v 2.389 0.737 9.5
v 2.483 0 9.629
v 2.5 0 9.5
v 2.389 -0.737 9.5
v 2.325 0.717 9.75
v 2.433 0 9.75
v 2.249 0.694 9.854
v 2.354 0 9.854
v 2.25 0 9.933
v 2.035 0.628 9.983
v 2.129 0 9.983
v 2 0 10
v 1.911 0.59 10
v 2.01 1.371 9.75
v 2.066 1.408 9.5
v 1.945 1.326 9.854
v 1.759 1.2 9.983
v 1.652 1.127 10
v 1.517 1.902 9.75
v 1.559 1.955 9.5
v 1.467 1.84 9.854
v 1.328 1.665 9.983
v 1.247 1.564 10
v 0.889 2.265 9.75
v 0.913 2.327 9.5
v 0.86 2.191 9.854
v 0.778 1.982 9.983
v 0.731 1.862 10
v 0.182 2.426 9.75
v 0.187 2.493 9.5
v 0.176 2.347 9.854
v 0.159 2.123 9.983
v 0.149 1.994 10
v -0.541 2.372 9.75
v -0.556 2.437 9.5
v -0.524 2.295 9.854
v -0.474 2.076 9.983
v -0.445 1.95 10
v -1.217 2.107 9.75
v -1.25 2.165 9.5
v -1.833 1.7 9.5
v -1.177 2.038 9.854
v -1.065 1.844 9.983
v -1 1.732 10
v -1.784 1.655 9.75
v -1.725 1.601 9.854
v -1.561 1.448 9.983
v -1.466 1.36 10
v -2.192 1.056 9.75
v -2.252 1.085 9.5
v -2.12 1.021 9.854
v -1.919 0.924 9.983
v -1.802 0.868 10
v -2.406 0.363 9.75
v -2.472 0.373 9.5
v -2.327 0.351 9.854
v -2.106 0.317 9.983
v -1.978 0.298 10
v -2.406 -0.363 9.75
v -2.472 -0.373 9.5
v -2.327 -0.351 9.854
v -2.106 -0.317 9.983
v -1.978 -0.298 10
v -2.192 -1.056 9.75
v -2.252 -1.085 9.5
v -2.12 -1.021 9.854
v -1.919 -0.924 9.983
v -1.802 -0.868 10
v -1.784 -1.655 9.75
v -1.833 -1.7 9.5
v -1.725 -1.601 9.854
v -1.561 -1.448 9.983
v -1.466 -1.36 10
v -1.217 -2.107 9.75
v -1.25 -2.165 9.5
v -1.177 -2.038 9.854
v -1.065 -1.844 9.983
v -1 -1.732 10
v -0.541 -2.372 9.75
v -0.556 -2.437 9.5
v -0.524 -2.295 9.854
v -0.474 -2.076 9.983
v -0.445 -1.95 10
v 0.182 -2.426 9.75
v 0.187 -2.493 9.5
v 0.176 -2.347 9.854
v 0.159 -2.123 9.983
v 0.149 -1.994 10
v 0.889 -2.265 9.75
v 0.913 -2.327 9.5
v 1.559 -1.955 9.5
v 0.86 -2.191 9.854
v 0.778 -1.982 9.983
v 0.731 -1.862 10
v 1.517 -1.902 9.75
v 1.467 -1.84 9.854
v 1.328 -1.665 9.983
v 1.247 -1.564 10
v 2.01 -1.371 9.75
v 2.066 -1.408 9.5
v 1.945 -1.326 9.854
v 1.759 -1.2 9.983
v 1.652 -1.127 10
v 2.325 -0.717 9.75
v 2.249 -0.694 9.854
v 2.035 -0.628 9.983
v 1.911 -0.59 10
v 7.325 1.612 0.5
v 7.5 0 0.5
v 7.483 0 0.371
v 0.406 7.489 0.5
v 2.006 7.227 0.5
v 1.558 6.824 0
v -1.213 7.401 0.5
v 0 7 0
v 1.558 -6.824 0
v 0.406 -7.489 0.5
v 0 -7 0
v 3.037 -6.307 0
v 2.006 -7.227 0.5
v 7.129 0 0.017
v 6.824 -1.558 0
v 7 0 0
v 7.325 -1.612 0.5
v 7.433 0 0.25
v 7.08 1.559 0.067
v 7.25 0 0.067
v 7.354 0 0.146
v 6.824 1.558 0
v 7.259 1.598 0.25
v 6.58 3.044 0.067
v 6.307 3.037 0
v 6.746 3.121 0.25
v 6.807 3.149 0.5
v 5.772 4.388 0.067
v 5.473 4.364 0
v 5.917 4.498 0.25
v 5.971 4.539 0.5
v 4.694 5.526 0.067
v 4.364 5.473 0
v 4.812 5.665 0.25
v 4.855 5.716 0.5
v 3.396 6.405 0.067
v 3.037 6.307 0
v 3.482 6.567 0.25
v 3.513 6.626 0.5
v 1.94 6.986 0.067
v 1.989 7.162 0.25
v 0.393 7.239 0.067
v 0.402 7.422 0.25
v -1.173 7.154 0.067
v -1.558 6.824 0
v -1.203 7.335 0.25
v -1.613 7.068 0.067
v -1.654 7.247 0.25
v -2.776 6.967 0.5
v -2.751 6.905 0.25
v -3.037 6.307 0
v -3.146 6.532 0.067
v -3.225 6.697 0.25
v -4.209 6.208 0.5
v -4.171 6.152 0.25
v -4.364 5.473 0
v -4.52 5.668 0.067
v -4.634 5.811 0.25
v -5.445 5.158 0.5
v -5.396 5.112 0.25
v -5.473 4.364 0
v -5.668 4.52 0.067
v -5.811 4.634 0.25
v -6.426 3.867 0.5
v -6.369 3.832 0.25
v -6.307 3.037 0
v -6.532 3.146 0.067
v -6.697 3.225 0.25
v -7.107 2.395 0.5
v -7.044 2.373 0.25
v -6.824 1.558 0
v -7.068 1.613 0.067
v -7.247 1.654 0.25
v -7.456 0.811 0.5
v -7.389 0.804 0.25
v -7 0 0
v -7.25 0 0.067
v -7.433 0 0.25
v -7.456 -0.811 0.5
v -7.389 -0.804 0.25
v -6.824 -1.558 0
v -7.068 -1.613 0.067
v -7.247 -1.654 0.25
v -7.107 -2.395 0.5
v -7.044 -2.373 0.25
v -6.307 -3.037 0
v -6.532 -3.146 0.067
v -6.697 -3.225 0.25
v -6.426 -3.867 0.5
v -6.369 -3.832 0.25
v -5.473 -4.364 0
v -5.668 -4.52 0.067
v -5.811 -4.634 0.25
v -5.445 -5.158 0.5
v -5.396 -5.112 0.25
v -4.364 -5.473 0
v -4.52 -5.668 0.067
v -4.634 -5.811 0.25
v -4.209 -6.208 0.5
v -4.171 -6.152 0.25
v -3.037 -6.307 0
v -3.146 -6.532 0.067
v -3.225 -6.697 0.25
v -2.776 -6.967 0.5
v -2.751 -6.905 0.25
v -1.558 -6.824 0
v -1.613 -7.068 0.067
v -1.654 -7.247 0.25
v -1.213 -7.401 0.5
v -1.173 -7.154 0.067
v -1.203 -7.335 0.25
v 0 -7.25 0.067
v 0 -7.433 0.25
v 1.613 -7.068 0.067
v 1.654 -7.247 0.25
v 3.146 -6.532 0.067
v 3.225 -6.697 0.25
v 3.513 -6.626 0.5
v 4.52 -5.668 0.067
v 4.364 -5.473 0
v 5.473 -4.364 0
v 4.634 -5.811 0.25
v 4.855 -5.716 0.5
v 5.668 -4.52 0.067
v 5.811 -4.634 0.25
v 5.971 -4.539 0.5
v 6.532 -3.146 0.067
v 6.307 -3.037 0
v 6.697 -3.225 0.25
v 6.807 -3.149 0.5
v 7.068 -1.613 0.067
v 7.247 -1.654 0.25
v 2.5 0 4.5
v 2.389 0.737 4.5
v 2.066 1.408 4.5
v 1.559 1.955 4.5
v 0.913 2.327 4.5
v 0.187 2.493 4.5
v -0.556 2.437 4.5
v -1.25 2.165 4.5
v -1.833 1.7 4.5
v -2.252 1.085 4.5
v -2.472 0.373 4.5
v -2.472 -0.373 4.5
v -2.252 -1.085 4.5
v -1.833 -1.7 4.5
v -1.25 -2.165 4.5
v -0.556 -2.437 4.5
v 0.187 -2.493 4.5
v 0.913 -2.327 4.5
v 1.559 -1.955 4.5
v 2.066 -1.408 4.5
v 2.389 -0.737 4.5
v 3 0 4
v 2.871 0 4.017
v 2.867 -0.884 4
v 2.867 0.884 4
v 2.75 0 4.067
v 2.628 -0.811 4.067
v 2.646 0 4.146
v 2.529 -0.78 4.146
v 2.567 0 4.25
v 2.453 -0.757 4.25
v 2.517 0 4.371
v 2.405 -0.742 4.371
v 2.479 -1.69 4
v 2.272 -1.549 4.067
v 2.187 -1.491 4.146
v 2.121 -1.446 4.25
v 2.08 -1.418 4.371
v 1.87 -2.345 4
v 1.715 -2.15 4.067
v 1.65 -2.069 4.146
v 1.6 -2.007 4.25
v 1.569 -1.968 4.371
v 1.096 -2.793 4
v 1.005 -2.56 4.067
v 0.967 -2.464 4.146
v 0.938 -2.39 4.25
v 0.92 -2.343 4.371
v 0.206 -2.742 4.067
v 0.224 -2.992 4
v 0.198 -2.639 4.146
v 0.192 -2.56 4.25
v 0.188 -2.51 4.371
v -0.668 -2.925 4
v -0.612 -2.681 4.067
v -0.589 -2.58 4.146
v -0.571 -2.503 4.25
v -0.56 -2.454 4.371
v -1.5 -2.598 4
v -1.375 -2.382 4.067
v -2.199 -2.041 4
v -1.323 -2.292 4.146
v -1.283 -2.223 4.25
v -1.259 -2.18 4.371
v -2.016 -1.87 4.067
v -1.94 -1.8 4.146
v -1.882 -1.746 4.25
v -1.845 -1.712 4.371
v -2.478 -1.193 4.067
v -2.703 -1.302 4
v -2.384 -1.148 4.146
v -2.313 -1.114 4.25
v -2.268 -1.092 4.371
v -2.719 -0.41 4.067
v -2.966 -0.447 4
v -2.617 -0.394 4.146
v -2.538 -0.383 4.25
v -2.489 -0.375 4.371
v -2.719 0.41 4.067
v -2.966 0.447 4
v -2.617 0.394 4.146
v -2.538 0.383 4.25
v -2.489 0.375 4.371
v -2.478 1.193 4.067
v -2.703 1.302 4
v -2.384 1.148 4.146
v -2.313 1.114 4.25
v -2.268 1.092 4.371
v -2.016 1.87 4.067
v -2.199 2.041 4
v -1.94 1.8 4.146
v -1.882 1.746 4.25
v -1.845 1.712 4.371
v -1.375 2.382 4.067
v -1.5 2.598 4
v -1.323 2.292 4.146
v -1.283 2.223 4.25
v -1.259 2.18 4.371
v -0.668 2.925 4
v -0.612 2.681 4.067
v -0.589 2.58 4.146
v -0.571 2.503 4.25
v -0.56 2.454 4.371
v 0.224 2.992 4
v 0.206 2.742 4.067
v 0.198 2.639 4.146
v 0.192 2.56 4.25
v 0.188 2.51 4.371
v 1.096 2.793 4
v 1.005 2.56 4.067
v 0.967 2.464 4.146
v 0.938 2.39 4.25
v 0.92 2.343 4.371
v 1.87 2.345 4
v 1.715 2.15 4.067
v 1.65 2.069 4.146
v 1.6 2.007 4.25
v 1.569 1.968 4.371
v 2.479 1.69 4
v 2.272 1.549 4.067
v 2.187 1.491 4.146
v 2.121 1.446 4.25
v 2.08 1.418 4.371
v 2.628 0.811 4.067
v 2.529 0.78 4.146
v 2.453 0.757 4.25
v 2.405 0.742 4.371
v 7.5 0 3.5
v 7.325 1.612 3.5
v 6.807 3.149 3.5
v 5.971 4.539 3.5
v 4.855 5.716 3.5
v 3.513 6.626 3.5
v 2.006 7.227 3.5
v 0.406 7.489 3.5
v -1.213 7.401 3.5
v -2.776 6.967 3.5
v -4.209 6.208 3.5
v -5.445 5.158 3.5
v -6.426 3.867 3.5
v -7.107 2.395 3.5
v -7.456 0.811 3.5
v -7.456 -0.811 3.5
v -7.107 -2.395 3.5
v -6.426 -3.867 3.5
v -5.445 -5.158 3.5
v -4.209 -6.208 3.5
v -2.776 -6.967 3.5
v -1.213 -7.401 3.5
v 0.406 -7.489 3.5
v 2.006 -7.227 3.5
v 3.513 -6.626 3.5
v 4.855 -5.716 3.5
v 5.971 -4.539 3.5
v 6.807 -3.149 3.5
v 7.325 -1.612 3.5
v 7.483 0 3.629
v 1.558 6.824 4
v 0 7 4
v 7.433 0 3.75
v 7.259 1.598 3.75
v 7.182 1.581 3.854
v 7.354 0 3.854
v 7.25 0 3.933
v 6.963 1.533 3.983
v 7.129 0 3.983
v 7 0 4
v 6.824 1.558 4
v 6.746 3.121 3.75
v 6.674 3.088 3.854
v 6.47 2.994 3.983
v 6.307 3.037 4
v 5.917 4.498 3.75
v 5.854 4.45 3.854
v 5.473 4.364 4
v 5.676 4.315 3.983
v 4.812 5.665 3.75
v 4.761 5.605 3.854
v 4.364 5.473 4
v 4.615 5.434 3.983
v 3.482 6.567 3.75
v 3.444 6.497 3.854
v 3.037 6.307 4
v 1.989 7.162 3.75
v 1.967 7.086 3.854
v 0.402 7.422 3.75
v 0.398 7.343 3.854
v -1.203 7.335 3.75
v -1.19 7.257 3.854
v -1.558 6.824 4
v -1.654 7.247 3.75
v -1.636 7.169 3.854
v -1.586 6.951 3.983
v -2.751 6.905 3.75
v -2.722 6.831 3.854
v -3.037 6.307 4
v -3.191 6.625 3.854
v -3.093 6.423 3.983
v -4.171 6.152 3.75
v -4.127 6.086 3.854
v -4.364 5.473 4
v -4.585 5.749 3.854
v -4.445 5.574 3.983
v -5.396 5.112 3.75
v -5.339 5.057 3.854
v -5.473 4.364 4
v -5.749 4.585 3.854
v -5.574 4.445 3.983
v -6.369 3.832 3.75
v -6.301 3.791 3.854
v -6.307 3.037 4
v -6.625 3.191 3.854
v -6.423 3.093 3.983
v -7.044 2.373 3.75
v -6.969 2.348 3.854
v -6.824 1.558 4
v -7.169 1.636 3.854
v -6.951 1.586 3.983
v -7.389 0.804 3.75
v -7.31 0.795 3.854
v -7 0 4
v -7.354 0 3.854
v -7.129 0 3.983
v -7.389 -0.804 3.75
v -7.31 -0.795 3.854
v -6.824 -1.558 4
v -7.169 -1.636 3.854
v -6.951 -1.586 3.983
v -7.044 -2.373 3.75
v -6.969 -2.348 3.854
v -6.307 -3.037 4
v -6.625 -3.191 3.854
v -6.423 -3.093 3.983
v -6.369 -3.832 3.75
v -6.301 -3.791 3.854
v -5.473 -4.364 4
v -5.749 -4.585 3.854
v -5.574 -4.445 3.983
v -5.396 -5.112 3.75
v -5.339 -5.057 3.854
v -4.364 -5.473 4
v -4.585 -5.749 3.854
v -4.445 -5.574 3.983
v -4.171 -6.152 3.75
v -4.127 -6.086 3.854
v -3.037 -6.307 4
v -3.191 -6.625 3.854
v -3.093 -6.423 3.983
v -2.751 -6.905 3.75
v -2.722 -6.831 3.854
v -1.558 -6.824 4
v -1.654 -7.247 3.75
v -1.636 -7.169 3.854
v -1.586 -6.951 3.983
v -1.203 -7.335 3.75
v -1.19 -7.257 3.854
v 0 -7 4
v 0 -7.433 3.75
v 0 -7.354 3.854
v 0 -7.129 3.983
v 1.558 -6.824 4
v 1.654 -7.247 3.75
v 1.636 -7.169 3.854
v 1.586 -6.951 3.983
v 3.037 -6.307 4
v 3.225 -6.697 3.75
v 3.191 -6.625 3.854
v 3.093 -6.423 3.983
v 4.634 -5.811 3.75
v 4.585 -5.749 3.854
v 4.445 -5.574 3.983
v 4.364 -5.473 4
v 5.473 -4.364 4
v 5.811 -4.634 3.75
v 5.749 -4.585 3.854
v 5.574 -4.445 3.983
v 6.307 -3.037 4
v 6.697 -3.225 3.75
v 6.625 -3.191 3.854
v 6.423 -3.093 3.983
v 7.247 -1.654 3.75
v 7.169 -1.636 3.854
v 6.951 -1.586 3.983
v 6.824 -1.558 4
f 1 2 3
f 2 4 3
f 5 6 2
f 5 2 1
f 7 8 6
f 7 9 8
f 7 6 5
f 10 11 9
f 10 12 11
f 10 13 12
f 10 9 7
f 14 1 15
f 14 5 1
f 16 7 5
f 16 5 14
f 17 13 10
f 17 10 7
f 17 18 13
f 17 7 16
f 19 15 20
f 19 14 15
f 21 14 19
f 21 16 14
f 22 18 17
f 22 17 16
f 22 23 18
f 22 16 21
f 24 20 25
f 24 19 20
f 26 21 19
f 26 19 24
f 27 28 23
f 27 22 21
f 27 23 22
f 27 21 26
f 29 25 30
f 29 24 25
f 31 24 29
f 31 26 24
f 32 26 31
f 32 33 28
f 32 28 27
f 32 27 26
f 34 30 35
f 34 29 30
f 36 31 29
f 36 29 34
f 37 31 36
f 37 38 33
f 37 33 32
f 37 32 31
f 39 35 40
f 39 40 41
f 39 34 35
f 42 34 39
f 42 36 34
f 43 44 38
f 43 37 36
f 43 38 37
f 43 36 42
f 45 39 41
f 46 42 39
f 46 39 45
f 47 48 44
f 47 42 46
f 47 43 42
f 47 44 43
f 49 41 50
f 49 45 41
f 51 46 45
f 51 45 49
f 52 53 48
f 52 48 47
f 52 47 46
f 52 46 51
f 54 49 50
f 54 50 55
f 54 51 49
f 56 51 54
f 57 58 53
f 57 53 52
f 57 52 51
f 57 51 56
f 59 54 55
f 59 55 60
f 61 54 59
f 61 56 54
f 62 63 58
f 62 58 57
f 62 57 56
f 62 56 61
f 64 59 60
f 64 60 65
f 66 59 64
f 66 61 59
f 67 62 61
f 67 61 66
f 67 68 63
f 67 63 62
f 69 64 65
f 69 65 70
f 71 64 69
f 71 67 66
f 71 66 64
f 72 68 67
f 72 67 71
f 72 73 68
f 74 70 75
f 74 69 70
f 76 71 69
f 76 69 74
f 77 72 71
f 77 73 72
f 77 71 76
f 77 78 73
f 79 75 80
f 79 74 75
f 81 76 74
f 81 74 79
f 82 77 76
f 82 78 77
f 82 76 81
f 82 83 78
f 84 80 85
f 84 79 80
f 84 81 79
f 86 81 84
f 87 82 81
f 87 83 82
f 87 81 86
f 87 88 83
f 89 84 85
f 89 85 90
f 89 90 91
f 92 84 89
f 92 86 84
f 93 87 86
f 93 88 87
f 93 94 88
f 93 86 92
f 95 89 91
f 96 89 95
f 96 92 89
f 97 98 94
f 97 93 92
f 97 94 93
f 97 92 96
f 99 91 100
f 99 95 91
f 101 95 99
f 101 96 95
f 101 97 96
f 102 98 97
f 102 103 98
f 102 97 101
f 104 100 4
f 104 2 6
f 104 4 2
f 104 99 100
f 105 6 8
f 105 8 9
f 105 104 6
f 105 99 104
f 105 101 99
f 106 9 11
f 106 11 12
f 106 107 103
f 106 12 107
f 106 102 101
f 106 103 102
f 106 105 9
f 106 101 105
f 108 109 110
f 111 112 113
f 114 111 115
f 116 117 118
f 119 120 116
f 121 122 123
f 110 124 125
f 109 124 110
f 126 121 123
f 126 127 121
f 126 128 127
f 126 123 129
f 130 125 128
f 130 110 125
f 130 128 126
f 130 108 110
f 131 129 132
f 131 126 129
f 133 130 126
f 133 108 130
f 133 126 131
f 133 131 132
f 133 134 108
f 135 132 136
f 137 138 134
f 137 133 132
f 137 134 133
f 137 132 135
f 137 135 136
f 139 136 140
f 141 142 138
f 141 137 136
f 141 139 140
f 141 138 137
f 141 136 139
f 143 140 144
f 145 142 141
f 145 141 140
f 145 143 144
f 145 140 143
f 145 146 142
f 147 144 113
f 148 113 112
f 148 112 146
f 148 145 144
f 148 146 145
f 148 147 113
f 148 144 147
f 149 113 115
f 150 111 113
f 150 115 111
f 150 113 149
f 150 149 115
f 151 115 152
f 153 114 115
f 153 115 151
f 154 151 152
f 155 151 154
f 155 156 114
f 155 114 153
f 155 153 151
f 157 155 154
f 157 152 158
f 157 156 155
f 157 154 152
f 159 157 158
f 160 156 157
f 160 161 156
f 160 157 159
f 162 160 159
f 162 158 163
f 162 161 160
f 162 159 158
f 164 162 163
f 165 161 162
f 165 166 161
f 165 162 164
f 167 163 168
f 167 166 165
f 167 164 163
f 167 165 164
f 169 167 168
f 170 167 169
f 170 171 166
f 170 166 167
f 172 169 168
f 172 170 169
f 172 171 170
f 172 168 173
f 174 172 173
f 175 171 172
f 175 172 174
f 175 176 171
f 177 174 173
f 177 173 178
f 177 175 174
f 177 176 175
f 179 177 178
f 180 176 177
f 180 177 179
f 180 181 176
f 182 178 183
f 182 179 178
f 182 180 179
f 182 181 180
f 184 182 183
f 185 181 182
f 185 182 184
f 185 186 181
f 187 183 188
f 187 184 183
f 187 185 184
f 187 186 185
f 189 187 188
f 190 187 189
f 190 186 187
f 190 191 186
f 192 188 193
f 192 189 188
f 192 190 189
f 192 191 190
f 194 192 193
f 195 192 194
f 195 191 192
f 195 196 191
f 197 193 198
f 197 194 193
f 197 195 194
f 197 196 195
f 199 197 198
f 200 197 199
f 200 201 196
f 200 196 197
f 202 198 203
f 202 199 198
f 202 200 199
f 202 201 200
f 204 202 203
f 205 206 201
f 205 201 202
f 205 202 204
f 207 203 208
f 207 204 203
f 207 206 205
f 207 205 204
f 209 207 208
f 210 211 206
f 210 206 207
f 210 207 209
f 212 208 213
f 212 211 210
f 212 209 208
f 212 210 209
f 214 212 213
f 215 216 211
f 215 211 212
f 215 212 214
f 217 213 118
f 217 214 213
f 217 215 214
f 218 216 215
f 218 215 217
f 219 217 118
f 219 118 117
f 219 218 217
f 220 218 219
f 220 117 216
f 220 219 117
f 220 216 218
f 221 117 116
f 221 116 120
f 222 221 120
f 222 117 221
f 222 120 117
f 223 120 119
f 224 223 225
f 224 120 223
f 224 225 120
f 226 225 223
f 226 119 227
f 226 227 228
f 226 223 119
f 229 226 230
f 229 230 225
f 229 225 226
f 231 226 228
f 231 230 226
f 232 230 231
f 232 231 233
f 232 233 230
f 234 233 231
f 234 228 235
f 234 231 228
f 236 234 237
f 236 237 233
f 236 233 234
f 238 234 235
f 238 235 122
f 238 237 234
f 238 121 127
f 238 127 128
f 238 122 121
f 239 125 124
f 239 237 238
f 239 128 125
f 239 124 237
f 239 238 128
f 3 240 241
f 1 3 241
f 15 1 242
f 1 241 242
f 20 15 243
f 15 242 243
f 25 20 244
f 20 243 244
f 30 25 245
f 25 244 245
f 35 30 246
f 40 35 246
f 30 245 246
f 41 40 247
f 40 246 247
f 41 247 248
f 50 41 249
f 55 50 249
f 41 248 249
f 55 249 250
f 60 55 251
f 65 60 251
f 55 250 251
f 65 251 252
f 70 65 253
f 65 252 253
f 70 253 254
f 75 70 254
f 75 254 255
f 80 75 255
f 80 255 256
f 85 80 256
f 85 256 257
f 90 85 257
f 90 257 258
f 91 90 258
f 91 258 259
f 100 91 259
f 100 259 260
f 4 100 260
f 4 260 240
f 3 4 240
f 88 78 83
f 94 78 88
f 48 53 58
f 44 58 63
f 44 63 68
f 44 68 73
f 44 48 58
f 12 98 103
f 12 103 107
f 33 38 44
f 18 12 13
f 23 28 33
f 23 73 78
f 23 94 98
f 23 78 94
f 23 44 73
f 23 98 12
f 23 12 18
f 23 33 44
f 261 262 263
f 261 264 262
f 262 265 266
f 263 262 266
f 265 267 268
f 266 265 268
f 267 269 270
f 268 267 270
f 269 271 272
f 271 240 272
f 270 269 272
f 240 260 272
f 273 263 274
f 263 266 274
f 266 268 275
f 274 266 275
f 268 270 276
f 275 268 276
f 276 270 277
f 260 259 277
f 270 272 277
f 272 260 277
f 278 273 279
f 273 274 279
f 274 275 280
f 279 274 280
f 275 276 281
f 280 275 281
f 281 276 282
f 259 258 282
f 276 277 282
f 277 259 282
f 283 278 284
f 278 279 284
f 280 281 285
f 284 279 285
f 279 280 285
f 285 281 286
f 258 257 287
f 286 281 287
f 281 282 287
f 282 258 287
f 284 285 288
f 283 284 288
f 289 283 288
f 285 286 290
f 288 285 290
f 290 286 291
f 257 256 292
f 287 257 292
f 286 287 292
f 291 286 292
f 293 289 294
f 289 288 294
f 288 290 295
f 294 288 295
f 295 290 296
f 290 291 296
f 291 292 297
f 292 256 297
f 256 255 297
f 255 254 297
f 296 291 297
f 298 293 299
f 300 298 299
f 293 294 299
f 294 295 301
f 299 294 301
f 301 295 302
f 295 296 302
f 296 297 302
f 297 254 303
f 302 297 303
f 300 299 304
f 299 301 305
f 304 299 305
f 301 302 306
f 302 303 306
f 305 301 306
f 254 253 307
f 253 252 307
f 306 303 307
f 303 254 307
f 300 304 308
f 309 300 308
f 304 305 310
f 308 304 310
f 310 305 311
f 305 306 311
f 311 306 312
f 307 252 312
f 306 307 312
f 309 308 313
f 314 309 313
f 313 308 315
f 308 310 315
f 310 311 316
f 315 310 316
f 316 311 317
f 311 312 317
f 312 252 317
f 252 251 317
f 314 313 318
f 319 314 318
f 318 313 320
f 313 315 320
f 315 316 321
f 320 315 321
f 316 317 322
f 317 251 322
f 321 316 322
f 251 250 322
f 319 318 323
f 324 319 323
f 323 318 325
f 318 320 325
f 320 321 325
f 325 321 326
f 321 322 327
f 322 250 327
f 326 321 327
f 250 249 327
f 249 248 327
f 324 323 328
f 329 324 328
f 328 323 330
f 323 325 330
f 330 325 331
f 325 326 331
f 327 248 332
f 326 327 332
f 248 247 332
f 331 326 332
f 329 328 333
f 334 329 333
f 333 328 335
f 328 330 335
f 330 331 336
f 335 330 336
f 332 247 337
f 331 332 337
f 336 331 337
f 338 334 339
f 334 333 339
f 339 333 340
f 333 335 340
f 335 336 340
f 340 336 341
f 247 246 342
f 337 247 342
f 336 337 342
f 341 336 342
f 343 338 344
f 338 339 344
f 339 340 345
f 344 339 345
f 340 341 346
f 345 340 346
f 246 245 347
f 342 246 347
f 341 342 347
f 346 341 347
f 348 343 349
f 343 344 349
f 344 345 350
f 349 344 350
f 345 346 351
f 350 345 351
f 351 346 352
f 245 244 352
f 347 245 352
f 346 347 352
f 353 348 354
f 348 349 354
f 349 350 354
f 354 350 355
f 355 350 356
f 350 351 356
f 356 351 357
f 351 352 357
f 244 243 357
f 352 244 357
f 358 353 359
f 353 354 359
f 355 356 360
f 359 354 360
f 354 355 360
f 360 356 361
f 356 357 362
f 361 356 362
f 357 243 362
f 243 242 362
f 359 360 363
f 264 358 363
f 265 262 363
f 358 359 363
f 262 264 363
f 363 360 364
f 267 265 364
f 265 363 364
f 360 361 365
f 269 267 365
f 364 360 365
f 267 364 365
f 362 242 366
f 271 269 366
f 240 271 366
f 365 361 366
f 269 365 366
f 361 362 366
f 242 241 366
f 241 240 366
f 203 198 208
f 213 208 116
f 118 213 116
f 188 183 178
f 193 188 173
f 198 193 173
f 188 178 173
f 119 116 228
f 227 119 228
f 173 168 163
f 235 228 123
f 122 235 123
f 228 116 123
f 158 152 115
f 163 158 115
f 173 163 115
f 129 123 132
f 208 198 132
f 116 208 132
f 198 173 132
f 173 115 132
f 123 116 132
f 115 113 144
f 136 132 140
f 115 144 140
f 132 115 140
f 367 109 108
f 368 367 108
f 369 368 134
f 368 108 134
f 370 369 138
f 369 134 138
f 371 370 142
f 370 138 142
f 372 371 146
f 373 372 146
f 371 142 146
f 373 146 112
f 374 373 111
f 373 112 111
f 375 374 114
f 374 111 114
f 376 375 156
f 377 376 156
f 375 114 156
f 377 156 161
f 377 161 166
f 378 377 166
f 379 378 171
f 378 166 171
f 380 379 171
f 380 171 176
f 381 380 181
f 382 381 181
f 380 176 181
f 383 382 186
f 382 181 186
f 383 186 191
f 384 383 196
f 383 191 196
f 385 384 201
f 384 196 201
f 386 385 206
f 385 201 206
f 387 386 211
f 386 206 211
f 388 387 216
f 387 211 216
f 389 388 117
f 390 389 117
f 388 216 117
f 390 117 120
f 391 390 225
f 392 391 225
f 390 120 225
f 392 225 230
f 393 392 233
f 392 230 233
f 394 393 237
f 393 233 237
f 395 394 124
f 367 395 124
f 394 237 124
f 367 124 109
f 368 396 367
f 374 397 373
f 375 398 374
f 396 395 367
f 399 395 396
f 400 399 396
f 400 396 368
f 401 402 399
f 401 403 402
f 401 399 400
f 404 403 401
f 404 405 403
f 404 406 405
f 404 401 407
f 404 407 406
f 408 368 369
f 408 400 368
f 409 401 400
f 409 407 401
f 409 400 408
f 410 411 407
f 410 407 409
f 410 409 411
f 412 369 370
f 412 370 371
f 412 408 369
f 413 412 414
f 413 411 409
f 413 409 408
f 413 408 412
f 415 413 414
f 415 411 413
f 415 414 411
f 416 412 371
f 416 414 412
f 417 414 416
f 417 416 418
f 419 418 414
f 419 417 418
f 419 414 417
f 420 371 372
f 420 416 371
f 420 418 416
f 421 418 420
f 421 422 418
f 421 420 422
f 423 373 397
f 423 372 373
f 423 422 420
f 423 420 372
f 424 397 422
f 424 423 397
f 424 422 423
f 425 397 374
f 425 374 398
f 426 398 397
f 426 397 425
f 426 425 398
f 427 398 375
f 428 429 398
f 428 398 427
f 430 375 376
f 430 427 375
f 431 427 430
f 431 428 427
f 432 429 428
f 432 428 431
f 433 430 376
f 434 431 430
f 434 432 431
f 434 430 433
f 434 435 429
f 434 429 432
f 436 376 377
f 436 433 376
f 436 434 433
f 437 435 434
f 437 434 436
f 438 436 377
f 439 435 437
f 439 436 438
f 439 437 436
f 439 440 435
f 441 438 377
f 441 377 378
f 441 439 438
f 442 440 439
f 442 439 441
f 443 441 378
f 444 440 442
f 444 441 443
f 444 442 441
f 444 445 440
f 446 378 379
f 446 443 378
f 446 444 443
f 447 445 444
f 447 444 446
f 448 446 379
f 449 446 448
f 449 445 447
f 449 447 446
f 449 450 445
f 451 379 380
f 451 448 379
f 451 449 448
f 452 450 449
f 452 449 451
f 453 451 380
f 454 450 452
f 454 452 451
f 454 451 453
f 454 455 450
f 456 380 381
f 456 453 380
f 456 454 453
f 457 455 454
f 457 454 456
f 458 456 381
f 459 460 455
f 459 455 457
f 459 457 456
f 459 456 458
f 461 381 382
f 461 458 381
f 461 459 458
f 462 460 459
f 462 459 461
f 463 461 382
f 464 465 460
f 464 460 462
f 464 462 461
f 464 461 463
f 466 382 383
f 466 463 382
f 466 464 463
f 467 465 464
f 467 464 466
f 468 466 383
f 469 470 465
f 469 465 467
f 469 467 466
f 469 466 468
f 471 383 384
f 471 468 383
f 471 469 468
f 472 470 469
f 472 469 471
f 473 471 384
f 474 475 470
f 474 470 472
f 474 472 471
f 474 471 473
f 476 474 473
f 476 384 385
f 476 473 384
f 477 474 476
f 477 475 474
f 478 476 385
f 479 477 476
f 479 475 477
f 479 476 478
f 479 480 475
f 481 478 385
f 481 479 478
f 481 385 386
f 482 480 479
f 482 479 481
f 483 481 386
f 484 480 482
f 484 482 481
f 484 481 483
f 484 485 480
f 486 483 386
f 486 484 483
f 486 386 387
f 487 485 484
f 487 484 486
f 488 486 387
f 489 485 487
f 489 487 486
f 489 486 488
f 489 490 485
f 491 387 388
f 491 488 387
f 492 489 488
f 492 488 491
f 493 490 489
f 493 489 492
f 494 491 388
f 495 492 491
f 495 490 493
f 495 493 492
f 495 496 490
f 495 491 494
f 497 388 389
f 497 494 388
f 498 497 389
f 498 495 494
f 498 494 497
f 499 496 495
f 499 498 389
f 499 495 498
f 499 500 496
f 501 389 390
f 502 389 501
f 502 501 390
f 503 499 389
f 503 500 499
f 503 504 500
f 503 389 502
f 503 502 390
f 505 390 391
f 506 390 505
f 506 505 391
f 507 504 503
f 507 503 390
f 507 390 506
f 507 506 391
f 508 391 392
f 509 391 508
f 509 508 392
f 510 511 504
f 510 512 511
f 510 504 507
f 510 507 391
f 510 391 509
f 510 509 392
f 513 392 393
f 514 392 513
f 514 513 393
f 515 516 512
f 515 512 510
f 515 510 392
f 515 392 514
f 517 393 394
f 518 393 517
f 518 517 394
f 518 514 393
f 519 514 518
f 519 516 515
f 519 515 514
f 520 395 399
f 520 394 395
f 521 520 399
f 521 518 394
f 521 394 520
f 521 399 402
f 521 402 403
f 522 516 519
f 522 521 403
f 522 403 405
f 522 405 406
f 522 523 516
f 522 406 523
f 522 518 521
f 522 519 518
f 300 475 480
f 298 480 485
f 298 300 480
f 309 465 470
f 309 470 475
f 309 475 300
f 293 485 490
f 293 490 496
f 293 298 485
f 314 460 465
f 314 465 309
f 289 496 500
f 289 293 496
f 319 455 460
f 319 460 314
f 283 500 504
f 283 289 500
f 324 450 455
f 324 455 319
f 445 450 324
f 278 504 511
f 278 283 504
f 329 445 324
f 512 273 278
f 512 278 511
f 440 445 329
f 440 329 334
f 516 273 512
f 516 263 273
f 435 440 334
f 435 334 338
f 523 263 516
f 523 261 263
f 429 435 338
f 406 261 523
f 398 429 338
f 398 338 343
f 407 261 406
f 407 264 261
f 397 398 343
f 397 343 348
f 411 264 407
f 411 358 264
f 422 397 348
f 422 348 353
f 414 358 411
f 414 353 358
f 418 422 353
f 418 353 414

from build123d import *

# Parameters (mm, degrees)
F0_R     = 7.5
F0_R_2   = 2.5
F1_DEPTH = 4
F2_DEPTH = 10
F3_R     = 0.5


with BuildPart() as f1:
    # F0 (on Top) → F1 (new body)
    with BuildSketch(Plane.XY):
        Circle(F0_R)
        Circle(F0_R_2, mode=Mode.SUBTRACT)
        Circle(F0_R_2)
    extrude(amount=F1_DEPTH)

    # F0 (on Top) → F2 (join)
    with BuildSketch(Plane.XY):
        Circle(F0_R_2)
    extrude(amount=F2_DEPTH)

    # F3
    f3_edges = [f1.edges().sort_by_distance(p)[0] for p in [
        (-7.5, 0, 4),
        (-7.5, 0, 0),
        (-2.5, 0, 10),
        (-2.5, 0, 4),
    ]]
    fillet(f3_edges, radius=F3_R)


solid = f1.part
